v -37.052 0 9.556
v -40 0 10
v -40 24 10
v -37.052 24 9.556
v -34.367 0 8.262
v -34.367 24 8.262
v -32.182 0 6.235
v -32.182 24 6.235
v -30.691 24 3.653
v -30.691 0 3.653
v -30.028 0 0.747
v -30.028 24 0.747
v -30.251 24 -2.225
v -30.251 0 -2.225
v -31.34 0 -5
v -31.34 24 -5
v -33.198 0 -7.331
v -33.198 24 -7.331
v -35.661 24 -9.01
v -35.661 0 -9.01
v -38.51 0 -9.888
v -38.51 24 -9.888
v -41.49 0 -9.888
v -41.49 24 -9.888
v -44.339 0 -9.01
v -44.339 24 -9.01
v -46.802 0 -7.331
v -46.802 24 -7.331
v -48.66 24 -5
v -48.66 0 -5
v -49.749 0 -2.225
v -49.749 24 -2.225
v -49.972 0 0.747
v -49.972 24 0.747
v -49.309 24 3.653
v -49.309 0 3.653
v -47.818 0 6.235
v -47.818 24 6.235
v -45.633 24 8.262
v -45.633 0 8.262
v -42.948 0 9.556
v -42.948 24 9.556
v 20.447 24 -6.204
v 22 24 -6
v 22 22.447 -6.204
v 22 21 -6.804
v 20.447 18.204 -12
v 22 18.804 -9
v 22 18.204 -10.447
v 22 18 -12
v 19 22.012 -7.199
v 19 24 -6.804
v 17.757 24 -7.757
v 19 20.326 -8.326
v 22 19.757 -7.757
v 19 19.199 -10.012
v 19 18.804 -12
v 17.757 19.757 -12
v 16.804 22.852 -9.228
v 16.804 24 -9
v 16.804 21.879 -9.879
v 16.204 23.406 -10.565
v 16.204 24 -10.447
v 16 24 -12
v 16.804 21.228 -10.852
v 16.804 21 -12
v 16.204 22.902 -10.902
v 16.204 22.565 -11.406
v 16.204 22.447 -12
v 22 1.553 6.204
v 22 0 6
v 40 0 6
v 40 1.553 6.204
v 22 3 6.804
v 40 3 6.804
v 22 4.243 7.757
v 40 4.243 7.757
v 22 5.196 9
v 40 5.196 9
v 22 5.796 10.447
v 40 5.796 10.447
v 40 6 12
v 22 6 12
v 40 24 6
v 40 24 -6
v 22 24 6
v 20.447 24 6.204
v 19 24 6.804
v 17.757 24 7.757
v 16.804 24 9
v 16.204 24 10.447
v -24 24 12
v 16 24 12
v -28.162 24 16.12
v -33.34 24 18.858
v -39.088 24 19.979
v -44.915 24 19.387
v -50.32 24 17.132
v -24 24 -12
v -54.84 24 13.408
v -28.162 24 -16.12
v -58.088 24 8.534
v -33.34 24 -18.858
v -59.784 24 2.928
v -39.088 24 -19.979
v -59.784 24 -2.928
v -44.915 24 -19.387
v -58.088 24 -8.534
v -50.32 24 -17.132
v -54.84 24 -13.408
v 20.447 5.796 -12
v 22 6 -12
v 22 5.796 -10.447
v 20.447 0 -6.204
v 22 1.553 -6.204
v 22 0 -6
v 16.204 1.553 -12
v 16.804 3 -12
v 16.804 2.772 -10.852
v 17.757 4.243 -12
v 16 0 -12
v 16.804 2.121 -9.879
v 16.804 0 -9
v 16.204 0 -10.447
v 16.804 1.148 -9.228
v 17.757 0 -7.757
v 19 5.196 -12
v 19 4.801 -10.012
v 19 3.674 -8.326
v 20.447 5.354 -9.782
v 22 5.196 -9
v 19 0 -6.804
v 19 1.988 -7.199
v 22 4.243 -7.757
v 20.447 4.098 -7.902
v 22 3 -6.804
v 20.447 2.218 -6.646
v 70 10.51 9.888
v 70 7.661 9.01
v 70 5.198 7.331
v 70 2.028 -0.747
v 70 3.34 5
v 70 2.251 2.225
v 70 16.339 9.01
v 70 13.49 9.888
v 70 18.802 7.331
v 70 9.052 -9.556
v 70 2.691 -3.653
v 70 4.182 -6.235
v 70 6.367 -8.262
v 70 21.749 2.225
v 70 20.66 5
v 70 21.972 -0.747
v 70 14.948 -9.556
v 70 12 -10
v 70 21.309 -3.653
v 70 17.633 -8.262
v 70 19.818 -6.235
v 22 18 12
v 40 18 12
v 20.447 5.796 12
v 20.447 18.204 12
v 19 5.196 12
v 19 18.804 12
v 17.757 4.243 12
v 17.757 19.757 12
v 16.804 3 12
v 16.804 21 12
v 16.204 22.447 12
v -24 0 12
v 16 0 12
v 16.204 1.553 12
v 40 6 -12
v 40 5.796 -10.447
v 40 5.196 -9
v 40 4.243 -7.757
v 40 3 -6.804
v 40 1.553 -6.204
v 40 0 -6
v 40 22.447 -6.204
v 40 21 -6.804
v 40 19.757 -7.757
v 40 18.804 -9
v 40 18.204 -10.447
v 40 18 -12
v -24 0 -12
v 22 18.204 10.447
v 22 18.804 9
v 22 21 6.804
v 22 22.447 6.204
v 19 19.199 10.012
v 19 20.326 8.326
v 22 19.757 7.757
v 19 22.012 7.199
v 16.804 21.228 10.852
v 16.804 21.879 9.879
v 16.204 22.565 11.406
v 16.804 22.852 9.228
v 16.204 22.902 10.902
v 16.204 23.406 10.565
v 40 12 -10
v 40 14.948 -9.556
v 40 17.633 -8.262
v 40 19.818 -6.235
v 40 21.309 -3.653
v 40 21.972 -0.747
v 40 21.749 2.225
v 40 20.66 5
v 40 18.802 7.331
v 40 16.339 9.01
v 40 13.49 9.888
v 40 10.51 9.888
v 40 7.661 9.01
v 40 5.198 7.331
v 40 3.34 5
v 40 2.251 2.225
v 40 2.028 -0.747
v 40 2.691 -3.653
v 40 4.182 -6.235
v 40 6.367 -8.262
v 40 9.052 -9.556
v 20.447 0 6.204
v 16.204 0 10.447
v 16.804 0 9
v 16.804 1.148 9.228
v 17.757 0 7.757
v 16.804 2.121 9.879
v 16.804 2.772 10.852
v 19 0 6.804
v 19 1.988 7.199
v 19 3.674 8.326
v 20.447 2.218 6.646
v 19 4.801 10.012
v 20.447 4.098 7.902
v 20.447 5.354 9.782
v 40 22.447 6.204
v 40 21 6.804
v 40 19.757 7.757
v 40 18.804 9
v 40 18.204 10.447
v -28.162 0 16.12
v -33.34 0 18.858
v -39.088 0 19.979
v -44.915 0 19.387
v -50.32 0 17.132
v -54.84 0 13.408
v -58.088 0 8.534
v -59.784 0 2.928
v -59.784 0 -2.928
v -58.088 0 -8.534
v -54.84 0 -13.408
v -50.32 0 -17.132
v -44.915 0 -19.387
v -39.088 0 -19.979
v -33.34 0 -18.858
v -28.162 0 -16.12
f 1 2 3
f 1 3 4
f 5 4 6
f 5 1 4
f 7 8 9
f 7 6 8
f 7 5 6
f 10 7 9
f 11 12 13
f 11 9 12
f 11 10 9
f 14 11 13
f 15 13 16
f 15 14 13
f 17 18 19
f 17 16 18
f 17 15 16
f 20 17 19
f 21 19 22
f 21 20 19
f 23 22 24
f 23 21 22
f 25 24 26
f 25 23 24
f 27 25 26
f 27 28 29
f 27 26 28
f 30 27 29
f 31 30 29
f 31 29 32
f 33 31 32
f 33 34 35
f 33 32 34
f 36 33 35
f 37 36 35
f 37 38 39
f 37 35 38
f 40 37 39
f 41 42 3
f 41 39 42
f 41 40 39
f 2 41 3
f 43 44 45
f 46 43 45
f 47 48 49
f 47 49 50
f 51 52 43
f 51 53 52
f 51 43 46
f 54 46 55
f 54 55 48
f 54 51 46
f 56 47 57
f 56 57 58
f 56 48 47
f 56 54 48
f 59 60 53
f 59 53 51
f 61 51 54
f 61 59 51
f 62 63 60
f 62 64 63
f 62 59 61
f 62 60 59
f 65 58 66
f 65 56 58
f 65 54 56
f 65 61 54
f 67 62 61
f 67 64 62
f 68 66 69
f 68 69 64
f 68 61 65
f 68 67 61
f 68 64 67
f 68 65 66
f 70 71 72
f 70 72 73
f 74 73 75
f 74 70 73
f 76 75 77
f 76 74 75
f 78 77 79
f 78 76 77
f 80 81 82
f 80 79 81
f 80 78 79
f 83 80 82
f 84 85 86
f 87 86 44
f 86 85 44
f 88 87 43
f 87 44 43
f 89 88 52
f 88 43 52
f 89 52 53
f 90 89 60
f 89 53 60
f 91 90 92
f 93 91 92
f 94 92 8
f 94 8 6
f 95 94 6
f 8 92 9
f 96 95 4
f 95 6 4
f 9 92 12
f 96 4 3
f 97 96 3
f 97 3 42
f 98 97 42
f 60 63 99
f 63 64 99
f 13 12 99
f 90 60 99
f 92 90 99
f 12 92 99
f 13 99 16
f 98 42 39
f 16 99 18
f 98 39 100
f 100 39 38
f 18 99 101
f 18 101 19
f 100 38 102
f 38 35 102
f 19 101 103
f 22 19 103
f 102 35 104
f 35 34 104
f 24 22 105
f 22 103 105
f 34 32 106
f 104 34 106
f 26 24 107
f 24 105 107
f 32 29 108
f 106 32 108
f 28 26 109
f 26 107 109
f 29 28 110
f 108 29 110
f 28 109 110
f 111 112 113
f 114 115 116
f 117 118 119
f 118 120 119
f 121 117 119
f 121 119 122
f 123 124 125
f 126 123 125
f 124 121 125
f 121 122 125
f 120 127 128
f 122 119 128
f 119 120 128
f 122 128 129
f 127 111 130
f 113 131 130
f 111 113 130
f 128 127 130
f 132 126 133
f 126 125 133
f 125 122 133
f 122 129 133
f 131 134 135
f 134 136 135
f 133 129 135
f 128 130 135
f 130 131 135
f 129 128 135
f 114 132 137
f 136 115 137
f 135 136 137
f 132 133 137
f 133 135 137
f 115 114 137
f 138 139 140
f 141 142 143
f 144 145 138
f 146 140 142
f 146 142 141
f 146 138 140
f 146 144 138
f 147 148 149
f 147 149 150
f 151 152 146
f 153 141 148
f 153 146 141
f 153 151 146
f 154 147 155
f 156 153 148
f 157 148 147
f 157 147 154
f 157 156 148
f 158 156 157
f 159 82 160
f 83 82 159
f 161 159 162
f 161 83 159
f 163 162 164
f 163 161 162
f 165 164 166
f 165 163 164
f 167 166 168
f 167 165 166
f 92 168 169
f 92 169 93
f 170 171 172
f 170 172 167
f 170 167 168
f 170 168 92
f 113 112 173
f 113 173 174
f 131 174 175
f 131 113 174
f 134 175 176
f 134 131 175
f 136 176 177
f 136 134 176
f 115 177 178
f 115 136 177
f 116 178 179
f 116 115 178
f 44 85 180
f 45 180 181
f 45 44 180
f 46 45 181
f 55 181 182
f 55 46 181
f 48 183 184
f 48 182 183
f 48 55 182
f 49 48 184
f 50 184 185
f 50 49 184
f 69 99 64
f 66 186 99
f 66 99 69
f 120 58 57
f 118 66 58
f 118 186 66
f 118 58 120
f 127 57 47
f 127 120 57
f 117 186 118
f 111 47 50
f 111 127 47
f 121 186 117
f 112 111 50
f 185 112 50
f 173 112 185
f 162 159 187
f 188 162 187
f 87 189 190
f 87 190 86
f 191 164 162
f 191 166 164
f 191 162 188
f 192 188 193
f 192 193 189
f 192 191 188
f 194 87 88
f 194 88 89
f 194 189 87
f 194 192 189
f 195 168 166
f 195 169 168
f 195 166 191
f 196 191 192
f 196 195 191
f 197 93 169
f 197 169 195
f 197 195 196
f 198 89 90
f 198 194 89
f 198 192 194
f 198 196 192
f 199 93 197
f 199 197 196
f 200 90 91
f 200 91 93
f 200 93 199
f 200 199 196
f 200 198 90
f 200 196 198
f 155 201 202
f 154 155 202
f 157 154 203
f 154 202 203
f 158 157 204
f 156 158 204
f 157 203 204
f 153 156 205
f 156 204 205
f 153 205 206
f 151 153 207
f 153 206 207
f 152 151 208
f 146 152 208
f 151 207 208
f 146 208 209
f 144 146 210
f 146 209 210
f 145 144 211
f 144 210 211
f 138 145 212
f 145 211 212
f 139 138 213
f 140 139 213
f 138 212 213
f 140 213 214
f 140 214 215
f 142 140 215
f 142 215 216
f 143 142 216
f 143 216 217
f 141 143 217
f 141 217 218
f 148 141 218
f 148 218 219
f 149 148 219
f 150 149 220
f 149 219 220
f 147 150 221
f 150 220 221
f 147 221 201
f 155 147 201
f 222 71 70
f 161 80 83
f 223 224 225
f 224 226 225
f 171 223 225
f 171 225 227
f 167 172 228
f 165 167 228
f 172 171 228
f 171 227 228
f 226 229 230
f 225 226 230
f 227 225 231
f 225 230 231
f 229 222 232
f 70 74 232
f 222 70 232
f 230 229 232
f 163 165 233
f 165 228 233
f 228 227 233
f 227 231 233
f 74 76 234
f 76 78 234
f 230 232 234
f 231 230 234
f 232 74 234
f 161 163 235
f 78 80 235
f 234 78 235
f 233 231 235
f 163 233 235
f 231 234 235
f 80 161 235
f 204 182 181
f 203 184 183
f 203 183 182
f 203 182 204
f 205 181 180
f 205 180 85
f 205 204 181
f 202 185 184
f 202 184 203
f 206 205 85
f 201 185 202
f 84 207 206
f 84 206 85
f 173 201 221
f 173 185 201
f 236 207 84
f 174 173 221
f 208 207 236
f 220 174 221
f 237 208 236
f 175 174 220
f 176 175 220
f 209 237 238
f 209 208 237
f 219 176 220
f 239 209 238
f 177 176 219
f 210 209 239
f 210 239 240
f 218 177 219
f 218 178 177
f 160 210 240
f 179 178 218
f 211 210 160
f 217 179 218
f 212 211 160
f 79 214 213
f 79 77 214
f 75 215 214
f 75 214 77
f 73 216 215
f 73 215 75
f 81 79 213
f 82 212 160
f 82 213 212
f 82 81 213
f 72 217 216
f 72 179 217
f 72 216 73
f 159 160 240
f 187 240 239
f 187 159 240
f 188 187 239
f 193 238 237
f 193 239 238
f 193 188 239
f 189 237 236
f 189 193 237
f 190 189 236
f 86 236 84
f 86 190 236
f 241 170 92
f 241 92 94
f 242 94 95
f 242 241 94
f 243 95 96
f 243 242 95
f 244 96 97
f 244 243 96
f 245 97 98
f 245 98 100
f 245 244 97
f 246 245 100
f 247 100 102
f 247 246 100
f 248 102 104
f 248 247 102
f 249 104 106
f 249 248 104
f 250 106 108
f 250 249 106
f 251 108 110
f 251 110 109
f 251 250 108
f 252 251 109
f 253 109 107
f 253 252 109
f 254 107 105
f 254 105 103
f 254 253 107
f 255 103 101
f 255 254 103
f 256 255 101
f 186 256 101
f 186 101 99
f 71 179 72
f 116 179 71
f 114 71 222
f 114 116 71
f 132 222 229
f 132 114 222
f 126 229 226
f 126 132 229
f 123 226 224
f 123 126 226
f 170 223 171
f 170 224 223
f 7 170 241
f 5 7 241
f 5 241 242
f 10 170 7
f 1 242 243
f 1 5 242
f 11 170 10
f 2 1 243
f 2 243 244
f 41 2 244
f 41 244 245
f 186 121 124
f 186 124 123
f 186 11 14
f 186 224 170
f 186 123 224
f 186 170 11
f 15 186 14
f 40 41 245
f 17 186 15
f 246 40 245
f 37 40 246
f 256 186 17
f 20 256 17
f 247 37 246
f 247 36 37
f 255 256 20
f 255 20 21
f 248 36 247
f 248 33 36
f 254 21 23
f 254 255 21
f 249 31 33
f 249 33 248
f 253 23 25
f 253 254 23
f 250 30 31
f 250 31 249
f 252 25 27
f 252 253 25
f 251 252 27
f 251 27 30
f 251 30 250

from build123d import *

# Parameters (mm, degrees)
BOSS_EXTRUDE1_DEPTH     = 24
SKETCH3_R               = 10
BOSS_EXTRUDE2_DEPTH     = 30
CUT_EXTRUDE1_DEPTH      = 77.655071587
CUT_EXTRUDE1_DEPTH_BACK = 77.655071587
SKETCH4_R               = 10
CUT_EXTRUDE2_DEPTH      = 105.76640683
CUT_EXTRUDE2_DEPTH_BACK = 24
SKETCH7_R               = 6
FILLET3_R               = 6


with BuildPart() as part:
    # Sketch2 → Boss-Extrude1 (new body)
    with BuildSketch(Plane(origin=(0, 0, 0), x_dir=(1, 0, 0), z_dir=(0, 1, 0))):
        with BuildLine():
            Line((-24, 12), (40, 12))
            Line((40, 12), (40, -12))
            Line((40, -12), (-24, -12))
            ThreePointArc((-24, -12), (-60, 0), (-24, 12))
        make_face()
    extrude(amount=BOSS_EXTRUDE1_DEPTH)

    # Sketch3 → Boss-Extrude2 (add)
    with BuildSketch(Plane(origin=(40, 0, 0), x_dir=(0, 0, -1), z_dir=(1, 0, 0))):
        with Locations((0, 12)):
            Circle(SKETCH3_R)
    extrude(amount=BOSS_EXTRUDE2_DEPTH)

    # Sketch4 → Cut-Extrude1 (cut, two sides: drawn at the far end of the back side and taken through both)
    with BuildSketch(Plane(origin=(0, 24, 0), x_dir=(1, 0, 0), z_dir=(0, 1, 0)).offset(-CUT_EXTRUDE1_DEPTH_BACK)):
        with Locations(Location((-40, 0, 0), (0, 0, 270))):
            Circle(SKETCH4_R)
    extrude(amount=CUT_EXTRUDE1_DEPTH + CUT_EXTRUDE1_DEPTH_BACK, mode=Mode.SUBTRACT)

    # Sketch7 → Cut-Extrude2 (cut, two sides: drawn at the far end of the back side and taken through both)
    with BuildSketch(Plane(origin=(40, 0, 0), x_dir=(0, 0, -1), z_dir=(1, 0, 0)).offset(-CUT_EXTRUDE2_DEPTH_BACK)):
        with Locations((-12, 24)):
            Circle(SKETCH7_R)
        with Locations((12, 24)):
            Circle(SKETCH7_R)
        with Locations((12, 0)):
            Circle(SKETCH7_R)
        with Locations((-12, 0)):
            Circle(SKETCH7_R)
    extrude(amount=CUT_EXTRUDE2_DEPTH + CUT_EXTRUDE2_DEPTH_BACK, mode=Mode.SUBTRACT)

    # Fillet3
    fillet3_edges = [part.edges().sort_by_distance(p)[0] for p in [
        (16, 4.242640687, -7.757359313),
        (16, 4.242640687, 7.757359313),
        (16, 19.757359313, -7.757359313),
        (16, 19.757359313, 7.757359313),
    ]]
    fillet(fillet3_edges, radius=FILLET3_R - 0.0001)  # a hair under: the kernel refuses the full size


solid = part.part
